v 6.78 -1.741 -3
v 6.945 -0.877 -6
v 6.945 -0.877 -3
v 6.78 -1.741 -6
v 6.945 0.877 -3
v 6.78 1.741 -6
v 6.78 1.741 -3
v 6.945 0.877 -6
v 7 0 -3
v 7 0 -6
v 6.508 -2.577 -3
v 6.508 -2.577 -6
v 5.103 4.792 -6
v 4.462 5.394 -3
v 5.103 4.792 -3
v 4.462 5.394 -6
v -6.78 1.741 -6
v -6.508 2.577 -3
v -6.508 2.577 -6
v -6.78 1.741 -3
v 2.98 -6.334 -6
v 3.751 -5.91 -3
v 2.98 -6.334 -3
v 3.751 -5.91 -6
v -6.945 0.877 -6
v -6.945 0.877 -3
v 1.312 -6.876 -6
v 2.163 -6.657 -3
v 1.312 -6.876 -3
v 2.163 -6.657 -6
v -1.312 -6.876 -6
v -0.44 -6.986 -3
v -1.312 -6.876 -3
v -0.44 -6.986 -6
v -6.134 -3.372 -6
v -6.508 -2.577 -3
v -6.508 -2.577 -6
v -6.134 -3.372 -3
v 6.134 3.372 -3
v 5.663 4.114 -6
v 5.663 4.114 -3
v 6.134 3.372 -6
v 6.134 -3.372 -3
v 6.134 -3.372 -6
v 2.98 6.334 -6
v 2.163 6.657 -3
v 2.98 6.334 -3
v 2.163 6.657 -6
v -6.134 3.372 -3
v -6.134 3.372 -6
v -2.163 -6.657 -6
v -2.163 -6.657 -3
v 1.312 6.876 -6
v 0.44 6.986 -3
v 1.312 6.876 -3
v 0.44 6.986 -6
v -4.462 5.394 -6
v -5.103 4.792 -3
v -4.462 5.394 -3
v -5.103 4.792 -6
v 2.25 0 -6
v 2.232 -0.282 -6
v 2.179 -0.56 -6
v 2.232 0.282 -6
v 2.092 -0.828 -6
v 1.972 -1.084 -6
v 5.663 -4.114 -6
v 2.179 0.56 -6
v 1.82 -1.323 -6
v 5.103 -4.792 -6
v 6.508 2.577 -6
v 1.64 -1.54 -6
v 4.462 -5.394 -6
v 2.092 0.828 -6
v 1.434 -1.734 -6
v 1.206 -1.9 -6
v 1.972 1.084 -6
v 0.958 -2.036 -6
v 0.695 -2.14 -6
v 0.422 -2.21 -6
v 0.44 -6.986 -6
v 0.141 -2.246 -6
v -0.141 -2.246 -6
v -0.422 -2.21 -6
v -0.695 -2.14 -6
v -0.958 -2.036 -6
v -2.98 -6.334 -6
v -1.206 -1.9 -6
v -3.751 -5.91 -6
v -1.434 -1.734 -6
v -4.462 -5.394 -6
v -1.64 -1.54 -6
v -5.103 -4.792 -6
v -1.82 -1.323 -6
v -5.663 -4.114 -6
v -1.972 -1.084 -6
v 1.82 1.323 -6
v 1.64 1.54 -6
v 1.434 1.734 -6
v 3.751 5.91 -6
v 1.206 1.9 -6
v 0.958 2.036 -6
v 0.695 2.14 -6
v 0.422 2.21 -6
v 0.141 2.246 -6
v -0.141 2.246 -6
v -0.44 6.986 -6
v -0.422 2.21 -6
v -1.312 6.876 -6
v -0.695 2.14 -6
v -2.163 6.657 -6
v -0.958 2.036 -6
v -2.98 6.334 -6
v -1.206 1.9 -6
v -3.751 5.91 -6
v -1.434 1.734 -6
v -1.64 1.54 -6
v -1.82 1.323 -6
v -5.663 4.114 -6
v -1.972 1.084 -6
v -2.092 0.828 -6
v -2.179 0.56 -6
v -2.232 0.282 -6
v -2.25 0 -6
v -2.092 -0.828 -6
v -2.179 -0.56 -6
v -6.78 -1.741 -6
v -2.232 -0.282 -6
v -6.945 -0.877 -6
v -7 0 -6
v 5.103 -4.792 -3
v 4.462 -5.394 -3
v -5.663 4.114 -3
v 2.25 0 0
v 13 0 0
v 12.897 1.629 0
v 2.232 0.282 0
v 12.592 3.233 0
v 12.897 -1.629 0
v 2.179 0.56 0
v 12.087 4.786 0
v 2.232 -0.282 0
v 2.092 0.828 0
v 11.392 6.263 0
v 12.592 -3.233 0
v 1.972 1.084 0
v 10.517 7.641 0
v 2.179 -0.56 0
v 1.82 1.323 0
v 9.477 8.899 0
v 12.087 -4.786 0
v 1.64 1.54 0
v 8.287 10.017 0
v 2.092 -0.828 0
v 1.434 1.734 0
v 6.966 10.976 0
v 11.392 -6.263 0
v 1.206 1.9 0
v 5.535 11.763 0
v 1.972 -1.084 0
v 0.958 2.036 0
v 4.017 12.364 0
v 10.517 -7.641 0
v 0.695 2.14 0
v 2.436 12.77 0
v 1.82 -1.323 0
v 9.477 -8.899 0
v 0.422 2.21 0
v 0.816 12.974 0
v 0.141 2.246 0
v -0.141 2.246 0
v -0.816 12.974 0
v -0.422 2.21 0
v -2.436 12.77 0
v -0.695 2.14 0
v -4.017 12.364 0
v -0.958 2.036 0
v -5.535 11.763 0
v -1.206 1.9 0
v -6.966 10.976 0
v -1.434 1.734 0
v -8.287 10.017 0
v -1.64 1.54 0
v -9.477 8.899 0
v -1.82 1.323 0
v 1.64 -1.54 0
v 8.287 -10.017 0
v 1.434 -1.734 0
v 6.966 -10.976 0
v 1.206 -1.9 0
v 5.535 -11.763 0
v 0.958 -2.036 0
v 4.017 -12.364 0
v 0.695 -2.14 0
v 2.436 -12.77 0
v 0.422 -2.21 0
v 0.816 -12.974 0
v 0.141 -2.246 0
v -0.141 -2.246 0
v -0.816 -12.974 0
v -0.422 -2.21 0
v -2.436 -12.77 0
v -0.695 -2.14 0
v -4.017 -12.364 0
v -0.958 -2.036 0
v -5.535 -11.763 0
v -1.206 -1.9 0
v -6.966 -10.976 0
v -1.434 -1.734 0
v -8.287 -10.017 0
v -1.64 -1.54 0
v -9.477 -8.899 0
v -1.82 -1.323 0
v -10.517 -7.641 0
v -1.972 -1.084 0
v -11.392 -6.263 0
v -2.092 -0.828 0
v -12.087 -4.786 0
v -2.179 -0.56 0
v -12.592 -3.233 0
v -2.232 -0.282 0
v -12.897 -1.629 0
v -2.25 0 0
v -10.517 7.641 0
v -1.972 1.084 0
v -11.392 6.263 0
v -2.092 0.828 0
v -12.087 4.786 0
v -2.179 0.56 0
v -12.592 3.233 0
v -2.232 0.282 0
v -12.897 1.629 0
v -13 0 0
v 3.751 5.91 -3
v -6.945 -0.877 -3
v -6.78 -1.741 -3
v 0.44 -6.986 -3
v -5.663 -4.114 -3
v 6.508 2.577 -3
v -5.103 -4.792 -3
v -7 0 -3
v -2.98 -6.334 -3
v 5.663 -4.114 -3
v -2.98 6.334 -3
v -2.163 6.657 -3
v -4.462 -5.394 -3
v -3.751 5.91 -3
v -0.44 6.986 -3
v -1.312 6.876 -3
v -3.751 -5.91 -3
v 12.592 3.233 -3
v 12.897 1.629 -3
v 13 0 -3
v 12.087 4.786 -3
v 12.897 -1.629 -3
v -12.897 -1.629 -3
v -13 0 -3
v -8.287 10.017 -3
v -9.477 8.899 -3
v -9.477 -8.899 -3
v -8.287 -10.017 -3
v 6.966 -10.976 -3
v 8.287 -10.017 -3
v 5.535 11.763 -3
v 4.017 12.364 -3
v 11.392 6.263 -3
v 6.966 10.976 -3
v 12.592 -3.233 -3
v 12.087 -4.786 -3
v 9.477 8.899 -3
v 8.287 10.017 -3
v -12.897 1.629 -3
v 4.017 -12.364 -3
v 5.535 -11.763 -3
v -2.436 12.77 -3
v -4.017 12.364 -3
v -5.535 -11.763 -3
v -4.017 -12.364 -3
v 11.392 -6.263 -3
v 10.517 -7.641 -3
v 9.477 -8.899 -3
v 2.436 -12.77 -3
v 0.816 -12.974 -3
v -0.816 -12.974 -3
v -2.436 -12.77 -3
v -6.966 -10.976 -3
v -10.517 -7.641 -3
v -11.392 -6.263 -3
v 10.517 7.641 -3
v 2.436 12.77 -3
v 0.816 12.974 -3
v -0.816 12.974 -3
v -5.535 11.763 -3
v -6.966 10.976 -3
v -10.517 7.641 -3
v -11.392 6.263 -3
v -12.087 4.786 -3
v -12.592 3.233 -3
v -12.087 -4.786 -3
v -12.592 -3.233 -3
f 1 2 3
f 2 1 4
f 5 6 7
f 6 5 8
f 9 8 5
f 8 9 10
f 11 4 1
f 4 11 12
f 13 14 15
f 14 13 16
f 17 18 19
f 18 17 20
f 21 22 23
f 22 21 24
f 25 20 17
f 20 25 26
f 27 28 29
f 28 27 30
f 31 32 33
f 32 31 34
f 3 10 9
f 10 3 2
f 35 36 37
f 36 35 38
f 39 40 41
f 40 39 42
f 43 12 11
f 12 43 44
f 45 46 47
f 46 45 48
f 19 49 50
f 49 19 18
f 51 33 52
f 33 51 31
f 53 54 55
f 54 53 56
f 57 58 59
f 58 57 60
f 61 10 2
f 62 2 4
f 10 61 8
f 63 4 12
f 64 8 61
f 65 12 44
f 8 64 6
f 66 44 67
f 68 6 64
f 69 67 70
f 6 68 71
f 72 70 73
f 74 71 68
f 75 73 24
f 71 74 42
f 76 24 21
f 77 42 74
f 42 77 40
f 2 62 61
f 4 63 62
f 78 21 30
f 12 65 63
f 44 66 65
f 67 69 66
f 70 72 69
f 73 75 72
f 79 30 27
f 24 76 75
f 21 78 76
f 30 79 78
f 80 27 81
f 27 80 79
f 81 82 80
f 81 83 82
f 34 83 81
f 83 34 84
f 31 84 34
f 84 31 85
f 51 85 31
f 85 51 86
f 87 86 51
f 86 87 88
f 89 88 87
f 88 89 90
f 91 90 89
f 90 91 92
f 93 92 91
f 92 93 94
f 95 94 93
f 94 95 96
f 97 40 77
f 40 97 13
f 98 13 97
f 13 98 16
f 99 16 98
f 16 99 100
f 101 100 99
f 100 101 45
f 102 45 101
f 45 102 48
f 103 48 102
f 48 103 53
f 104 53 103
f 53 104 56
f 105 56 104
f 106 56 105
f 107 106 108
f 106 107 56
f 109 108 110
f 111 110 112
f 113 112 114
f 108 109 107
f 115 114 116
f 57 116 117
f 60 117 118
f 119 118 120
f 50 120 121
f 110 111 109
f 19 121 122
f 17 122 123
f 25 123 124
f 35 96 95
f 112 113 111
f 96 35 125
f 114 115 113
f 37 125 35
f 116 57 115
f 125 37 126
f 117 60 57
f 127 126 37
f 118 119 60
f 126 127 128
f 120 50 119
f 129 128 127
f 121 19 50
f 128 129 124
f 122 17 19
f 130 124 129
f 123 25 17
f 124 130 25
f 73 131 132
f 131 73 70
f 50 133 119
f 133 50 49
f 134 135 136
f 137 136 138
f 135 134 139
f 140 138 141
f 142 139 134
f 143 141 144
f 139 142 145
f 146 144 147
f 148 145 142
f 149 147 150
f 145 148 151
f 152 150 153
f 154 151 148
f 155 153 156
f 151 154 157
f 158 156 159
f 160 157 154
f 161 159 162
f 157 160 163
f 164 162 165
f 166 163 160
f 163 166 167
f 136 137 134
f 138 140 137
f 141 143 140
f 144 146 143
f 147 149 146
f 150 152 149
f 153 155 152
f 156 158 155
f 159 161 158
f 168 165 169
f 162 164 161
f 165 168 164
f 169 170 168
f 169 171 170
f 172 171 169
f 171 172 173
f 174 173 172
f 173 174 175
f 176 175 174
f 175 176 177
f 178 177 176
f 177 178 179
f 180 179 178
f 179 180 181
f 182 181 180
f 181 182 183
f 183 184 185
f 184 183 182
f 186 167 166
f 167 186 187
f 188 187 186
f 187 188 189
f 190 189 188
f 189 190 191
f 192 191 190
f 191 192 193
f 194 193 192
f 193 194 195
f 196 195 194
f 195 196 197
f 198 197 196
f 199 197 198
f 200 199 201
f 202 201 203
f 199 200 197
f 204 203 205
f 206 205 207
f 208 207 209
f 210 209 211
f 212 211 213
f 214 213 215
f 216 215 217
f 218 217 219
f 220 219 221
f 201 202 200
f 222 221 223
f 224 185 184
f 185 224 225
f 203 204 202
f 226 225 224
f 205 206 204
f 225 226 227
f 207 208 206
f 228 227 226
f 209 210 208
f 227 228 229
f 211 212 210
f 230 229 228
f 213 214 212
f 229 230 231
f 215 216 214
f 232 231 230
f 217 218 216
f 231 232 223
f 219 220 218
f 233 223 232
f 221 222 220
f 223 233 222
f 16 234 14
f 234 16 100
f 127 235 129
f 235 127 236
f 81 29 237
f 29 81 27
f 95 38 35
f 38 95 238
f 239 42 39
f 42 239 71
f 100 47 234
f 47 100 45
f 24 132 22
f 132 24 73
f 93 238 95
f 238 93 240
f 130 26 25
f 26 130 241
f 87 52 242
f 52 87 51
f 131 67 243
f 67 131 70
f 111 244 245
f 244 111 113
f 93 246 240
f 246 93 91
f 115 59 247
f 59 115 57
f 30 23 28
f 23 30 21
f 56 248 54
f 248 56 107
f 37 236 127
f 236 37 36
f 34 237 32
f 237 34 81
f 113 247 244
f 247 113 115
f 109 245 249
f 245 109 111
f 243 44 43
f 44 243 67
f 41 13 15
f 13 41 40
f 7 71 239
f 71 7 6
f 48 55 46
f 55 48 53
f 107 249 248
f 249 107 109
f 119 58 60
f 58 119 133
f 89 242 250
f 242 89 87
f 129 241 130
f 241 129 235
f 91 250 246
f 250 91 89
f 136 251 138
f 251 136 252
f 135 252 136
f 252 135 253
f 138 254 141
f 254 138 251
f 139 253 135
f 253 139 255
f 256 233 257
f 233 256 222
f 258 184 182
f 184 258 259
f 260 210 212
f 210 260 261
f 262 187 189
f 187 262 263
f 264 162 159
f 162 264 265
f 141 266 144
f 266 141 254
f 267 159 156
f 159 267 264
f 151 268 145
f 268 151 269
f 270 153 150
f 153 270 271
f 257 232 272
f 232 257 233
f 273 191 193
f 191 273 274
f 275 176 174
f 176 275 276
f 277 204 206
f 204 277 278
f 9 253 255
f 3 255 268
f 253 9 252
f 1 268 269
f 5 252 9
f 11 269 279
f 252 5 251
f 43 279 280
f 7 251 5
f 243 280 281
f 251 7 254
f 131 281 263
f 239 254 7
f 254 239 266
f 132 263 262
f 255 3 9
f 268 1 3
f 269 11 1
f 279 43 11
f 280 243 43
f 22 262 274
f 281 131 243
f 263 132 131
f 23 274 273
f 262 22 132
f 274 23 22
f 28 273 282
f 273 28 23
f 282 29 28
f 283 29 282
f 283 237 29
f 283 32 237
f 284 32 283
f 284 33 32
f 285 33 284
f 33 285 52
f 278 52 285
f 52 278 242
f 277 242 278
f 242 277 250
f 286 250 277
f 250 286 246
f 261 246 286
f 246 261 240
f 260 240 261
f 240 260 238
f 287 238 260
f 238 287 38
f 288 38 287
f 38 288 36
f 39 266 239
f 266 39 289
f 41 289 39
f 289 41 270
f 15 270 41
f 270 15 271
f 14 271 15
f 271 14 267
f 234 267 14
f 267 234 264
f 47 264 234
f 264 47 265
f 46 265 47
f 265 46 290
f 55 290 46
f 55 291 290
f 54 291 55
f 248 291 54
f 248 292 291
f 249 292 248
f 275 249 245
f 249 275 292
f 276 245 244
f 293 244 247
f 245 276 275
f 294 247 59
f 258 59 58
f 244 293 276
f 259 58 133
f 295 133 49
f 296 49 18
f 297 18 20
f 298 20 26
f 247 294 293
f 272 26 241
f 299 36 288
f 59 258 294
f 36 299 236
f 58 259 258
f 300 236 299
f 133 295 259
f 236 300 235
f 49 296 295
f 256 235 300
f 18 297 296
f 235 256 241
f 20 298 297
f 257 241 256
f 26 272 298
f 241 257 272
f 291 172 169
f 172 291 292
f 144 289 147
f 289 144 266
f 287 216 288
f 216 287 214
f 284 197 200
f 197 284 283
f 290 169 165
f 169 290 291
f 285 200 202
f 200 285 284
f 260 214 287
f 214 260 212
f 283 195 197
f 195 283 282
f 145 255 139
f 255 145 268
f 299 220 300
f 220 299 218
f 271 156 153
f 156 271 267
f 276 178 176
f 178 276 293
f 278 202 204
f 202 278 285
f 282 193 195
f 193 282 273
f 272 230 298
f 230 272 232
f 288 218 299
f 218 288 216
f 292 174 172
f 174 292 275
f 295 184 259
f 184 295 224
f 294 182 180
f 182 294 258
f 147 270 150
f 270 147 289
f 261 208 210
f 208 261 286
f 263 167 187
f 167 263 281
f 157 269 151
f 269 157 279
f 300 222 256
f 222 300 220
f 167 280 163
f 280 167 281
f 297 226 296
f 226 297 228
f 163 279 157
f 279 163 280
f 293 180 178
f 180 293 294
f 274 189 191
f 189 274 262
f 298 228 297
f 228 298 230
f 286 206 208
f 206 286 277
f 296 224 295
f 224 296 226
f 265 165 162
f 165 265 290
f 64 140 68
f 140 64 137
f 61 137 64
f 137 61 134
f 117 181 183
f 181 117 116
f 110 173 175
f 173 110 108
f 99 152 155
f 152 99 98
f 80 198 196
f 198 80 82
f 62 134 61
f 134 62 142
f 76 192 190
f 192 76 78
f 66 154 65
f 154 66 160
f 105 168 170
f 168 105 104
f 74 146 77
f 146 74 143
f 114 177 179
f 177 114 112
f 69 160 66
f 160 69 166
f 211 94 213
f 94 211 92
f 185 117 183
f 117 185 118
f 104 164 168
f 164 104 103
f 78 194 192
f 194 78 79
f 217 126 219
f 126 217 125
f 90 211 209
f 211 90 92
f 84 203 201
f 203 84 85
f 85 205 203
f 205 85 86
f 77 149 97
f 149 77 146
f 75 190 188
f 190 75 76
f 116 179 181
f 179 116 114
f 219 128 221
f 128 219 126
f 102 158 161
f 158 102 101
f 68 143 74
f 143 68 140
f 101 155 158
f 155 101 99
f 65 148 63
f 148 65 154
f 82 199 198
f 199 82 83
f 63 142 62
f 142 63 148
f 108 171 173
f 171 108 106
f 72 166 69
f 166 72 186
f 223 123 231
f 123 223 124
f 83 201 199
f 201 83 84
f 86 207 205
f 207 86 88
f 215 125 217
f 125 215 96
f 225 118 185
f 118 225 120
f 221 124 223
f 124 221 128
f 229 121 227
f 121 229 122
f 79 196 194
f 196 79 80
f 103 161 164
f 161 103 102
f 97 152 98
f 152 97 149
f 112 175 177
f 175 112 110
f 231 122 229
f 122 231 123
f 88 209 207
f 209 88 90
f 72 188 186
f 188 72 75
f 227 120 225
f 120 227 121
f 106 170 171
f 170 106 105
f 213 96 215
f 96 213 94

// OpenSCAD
$fn = 50;


difference() {
	union() {
		translate(v = [0, 0, -6.0000000000]) {
			cylinder(h = 6, r = 7.0000000000);
		}
		translate(v = [0, 0, -3.0000000000]) {
			cylinder(h = 3, r = 13.0000000000);
		}
	}
	union() {
		#translate(v = [0, 0, -6]) {
			cylinder(h = 6, r = 2.2500000000);
		}
	}
}
